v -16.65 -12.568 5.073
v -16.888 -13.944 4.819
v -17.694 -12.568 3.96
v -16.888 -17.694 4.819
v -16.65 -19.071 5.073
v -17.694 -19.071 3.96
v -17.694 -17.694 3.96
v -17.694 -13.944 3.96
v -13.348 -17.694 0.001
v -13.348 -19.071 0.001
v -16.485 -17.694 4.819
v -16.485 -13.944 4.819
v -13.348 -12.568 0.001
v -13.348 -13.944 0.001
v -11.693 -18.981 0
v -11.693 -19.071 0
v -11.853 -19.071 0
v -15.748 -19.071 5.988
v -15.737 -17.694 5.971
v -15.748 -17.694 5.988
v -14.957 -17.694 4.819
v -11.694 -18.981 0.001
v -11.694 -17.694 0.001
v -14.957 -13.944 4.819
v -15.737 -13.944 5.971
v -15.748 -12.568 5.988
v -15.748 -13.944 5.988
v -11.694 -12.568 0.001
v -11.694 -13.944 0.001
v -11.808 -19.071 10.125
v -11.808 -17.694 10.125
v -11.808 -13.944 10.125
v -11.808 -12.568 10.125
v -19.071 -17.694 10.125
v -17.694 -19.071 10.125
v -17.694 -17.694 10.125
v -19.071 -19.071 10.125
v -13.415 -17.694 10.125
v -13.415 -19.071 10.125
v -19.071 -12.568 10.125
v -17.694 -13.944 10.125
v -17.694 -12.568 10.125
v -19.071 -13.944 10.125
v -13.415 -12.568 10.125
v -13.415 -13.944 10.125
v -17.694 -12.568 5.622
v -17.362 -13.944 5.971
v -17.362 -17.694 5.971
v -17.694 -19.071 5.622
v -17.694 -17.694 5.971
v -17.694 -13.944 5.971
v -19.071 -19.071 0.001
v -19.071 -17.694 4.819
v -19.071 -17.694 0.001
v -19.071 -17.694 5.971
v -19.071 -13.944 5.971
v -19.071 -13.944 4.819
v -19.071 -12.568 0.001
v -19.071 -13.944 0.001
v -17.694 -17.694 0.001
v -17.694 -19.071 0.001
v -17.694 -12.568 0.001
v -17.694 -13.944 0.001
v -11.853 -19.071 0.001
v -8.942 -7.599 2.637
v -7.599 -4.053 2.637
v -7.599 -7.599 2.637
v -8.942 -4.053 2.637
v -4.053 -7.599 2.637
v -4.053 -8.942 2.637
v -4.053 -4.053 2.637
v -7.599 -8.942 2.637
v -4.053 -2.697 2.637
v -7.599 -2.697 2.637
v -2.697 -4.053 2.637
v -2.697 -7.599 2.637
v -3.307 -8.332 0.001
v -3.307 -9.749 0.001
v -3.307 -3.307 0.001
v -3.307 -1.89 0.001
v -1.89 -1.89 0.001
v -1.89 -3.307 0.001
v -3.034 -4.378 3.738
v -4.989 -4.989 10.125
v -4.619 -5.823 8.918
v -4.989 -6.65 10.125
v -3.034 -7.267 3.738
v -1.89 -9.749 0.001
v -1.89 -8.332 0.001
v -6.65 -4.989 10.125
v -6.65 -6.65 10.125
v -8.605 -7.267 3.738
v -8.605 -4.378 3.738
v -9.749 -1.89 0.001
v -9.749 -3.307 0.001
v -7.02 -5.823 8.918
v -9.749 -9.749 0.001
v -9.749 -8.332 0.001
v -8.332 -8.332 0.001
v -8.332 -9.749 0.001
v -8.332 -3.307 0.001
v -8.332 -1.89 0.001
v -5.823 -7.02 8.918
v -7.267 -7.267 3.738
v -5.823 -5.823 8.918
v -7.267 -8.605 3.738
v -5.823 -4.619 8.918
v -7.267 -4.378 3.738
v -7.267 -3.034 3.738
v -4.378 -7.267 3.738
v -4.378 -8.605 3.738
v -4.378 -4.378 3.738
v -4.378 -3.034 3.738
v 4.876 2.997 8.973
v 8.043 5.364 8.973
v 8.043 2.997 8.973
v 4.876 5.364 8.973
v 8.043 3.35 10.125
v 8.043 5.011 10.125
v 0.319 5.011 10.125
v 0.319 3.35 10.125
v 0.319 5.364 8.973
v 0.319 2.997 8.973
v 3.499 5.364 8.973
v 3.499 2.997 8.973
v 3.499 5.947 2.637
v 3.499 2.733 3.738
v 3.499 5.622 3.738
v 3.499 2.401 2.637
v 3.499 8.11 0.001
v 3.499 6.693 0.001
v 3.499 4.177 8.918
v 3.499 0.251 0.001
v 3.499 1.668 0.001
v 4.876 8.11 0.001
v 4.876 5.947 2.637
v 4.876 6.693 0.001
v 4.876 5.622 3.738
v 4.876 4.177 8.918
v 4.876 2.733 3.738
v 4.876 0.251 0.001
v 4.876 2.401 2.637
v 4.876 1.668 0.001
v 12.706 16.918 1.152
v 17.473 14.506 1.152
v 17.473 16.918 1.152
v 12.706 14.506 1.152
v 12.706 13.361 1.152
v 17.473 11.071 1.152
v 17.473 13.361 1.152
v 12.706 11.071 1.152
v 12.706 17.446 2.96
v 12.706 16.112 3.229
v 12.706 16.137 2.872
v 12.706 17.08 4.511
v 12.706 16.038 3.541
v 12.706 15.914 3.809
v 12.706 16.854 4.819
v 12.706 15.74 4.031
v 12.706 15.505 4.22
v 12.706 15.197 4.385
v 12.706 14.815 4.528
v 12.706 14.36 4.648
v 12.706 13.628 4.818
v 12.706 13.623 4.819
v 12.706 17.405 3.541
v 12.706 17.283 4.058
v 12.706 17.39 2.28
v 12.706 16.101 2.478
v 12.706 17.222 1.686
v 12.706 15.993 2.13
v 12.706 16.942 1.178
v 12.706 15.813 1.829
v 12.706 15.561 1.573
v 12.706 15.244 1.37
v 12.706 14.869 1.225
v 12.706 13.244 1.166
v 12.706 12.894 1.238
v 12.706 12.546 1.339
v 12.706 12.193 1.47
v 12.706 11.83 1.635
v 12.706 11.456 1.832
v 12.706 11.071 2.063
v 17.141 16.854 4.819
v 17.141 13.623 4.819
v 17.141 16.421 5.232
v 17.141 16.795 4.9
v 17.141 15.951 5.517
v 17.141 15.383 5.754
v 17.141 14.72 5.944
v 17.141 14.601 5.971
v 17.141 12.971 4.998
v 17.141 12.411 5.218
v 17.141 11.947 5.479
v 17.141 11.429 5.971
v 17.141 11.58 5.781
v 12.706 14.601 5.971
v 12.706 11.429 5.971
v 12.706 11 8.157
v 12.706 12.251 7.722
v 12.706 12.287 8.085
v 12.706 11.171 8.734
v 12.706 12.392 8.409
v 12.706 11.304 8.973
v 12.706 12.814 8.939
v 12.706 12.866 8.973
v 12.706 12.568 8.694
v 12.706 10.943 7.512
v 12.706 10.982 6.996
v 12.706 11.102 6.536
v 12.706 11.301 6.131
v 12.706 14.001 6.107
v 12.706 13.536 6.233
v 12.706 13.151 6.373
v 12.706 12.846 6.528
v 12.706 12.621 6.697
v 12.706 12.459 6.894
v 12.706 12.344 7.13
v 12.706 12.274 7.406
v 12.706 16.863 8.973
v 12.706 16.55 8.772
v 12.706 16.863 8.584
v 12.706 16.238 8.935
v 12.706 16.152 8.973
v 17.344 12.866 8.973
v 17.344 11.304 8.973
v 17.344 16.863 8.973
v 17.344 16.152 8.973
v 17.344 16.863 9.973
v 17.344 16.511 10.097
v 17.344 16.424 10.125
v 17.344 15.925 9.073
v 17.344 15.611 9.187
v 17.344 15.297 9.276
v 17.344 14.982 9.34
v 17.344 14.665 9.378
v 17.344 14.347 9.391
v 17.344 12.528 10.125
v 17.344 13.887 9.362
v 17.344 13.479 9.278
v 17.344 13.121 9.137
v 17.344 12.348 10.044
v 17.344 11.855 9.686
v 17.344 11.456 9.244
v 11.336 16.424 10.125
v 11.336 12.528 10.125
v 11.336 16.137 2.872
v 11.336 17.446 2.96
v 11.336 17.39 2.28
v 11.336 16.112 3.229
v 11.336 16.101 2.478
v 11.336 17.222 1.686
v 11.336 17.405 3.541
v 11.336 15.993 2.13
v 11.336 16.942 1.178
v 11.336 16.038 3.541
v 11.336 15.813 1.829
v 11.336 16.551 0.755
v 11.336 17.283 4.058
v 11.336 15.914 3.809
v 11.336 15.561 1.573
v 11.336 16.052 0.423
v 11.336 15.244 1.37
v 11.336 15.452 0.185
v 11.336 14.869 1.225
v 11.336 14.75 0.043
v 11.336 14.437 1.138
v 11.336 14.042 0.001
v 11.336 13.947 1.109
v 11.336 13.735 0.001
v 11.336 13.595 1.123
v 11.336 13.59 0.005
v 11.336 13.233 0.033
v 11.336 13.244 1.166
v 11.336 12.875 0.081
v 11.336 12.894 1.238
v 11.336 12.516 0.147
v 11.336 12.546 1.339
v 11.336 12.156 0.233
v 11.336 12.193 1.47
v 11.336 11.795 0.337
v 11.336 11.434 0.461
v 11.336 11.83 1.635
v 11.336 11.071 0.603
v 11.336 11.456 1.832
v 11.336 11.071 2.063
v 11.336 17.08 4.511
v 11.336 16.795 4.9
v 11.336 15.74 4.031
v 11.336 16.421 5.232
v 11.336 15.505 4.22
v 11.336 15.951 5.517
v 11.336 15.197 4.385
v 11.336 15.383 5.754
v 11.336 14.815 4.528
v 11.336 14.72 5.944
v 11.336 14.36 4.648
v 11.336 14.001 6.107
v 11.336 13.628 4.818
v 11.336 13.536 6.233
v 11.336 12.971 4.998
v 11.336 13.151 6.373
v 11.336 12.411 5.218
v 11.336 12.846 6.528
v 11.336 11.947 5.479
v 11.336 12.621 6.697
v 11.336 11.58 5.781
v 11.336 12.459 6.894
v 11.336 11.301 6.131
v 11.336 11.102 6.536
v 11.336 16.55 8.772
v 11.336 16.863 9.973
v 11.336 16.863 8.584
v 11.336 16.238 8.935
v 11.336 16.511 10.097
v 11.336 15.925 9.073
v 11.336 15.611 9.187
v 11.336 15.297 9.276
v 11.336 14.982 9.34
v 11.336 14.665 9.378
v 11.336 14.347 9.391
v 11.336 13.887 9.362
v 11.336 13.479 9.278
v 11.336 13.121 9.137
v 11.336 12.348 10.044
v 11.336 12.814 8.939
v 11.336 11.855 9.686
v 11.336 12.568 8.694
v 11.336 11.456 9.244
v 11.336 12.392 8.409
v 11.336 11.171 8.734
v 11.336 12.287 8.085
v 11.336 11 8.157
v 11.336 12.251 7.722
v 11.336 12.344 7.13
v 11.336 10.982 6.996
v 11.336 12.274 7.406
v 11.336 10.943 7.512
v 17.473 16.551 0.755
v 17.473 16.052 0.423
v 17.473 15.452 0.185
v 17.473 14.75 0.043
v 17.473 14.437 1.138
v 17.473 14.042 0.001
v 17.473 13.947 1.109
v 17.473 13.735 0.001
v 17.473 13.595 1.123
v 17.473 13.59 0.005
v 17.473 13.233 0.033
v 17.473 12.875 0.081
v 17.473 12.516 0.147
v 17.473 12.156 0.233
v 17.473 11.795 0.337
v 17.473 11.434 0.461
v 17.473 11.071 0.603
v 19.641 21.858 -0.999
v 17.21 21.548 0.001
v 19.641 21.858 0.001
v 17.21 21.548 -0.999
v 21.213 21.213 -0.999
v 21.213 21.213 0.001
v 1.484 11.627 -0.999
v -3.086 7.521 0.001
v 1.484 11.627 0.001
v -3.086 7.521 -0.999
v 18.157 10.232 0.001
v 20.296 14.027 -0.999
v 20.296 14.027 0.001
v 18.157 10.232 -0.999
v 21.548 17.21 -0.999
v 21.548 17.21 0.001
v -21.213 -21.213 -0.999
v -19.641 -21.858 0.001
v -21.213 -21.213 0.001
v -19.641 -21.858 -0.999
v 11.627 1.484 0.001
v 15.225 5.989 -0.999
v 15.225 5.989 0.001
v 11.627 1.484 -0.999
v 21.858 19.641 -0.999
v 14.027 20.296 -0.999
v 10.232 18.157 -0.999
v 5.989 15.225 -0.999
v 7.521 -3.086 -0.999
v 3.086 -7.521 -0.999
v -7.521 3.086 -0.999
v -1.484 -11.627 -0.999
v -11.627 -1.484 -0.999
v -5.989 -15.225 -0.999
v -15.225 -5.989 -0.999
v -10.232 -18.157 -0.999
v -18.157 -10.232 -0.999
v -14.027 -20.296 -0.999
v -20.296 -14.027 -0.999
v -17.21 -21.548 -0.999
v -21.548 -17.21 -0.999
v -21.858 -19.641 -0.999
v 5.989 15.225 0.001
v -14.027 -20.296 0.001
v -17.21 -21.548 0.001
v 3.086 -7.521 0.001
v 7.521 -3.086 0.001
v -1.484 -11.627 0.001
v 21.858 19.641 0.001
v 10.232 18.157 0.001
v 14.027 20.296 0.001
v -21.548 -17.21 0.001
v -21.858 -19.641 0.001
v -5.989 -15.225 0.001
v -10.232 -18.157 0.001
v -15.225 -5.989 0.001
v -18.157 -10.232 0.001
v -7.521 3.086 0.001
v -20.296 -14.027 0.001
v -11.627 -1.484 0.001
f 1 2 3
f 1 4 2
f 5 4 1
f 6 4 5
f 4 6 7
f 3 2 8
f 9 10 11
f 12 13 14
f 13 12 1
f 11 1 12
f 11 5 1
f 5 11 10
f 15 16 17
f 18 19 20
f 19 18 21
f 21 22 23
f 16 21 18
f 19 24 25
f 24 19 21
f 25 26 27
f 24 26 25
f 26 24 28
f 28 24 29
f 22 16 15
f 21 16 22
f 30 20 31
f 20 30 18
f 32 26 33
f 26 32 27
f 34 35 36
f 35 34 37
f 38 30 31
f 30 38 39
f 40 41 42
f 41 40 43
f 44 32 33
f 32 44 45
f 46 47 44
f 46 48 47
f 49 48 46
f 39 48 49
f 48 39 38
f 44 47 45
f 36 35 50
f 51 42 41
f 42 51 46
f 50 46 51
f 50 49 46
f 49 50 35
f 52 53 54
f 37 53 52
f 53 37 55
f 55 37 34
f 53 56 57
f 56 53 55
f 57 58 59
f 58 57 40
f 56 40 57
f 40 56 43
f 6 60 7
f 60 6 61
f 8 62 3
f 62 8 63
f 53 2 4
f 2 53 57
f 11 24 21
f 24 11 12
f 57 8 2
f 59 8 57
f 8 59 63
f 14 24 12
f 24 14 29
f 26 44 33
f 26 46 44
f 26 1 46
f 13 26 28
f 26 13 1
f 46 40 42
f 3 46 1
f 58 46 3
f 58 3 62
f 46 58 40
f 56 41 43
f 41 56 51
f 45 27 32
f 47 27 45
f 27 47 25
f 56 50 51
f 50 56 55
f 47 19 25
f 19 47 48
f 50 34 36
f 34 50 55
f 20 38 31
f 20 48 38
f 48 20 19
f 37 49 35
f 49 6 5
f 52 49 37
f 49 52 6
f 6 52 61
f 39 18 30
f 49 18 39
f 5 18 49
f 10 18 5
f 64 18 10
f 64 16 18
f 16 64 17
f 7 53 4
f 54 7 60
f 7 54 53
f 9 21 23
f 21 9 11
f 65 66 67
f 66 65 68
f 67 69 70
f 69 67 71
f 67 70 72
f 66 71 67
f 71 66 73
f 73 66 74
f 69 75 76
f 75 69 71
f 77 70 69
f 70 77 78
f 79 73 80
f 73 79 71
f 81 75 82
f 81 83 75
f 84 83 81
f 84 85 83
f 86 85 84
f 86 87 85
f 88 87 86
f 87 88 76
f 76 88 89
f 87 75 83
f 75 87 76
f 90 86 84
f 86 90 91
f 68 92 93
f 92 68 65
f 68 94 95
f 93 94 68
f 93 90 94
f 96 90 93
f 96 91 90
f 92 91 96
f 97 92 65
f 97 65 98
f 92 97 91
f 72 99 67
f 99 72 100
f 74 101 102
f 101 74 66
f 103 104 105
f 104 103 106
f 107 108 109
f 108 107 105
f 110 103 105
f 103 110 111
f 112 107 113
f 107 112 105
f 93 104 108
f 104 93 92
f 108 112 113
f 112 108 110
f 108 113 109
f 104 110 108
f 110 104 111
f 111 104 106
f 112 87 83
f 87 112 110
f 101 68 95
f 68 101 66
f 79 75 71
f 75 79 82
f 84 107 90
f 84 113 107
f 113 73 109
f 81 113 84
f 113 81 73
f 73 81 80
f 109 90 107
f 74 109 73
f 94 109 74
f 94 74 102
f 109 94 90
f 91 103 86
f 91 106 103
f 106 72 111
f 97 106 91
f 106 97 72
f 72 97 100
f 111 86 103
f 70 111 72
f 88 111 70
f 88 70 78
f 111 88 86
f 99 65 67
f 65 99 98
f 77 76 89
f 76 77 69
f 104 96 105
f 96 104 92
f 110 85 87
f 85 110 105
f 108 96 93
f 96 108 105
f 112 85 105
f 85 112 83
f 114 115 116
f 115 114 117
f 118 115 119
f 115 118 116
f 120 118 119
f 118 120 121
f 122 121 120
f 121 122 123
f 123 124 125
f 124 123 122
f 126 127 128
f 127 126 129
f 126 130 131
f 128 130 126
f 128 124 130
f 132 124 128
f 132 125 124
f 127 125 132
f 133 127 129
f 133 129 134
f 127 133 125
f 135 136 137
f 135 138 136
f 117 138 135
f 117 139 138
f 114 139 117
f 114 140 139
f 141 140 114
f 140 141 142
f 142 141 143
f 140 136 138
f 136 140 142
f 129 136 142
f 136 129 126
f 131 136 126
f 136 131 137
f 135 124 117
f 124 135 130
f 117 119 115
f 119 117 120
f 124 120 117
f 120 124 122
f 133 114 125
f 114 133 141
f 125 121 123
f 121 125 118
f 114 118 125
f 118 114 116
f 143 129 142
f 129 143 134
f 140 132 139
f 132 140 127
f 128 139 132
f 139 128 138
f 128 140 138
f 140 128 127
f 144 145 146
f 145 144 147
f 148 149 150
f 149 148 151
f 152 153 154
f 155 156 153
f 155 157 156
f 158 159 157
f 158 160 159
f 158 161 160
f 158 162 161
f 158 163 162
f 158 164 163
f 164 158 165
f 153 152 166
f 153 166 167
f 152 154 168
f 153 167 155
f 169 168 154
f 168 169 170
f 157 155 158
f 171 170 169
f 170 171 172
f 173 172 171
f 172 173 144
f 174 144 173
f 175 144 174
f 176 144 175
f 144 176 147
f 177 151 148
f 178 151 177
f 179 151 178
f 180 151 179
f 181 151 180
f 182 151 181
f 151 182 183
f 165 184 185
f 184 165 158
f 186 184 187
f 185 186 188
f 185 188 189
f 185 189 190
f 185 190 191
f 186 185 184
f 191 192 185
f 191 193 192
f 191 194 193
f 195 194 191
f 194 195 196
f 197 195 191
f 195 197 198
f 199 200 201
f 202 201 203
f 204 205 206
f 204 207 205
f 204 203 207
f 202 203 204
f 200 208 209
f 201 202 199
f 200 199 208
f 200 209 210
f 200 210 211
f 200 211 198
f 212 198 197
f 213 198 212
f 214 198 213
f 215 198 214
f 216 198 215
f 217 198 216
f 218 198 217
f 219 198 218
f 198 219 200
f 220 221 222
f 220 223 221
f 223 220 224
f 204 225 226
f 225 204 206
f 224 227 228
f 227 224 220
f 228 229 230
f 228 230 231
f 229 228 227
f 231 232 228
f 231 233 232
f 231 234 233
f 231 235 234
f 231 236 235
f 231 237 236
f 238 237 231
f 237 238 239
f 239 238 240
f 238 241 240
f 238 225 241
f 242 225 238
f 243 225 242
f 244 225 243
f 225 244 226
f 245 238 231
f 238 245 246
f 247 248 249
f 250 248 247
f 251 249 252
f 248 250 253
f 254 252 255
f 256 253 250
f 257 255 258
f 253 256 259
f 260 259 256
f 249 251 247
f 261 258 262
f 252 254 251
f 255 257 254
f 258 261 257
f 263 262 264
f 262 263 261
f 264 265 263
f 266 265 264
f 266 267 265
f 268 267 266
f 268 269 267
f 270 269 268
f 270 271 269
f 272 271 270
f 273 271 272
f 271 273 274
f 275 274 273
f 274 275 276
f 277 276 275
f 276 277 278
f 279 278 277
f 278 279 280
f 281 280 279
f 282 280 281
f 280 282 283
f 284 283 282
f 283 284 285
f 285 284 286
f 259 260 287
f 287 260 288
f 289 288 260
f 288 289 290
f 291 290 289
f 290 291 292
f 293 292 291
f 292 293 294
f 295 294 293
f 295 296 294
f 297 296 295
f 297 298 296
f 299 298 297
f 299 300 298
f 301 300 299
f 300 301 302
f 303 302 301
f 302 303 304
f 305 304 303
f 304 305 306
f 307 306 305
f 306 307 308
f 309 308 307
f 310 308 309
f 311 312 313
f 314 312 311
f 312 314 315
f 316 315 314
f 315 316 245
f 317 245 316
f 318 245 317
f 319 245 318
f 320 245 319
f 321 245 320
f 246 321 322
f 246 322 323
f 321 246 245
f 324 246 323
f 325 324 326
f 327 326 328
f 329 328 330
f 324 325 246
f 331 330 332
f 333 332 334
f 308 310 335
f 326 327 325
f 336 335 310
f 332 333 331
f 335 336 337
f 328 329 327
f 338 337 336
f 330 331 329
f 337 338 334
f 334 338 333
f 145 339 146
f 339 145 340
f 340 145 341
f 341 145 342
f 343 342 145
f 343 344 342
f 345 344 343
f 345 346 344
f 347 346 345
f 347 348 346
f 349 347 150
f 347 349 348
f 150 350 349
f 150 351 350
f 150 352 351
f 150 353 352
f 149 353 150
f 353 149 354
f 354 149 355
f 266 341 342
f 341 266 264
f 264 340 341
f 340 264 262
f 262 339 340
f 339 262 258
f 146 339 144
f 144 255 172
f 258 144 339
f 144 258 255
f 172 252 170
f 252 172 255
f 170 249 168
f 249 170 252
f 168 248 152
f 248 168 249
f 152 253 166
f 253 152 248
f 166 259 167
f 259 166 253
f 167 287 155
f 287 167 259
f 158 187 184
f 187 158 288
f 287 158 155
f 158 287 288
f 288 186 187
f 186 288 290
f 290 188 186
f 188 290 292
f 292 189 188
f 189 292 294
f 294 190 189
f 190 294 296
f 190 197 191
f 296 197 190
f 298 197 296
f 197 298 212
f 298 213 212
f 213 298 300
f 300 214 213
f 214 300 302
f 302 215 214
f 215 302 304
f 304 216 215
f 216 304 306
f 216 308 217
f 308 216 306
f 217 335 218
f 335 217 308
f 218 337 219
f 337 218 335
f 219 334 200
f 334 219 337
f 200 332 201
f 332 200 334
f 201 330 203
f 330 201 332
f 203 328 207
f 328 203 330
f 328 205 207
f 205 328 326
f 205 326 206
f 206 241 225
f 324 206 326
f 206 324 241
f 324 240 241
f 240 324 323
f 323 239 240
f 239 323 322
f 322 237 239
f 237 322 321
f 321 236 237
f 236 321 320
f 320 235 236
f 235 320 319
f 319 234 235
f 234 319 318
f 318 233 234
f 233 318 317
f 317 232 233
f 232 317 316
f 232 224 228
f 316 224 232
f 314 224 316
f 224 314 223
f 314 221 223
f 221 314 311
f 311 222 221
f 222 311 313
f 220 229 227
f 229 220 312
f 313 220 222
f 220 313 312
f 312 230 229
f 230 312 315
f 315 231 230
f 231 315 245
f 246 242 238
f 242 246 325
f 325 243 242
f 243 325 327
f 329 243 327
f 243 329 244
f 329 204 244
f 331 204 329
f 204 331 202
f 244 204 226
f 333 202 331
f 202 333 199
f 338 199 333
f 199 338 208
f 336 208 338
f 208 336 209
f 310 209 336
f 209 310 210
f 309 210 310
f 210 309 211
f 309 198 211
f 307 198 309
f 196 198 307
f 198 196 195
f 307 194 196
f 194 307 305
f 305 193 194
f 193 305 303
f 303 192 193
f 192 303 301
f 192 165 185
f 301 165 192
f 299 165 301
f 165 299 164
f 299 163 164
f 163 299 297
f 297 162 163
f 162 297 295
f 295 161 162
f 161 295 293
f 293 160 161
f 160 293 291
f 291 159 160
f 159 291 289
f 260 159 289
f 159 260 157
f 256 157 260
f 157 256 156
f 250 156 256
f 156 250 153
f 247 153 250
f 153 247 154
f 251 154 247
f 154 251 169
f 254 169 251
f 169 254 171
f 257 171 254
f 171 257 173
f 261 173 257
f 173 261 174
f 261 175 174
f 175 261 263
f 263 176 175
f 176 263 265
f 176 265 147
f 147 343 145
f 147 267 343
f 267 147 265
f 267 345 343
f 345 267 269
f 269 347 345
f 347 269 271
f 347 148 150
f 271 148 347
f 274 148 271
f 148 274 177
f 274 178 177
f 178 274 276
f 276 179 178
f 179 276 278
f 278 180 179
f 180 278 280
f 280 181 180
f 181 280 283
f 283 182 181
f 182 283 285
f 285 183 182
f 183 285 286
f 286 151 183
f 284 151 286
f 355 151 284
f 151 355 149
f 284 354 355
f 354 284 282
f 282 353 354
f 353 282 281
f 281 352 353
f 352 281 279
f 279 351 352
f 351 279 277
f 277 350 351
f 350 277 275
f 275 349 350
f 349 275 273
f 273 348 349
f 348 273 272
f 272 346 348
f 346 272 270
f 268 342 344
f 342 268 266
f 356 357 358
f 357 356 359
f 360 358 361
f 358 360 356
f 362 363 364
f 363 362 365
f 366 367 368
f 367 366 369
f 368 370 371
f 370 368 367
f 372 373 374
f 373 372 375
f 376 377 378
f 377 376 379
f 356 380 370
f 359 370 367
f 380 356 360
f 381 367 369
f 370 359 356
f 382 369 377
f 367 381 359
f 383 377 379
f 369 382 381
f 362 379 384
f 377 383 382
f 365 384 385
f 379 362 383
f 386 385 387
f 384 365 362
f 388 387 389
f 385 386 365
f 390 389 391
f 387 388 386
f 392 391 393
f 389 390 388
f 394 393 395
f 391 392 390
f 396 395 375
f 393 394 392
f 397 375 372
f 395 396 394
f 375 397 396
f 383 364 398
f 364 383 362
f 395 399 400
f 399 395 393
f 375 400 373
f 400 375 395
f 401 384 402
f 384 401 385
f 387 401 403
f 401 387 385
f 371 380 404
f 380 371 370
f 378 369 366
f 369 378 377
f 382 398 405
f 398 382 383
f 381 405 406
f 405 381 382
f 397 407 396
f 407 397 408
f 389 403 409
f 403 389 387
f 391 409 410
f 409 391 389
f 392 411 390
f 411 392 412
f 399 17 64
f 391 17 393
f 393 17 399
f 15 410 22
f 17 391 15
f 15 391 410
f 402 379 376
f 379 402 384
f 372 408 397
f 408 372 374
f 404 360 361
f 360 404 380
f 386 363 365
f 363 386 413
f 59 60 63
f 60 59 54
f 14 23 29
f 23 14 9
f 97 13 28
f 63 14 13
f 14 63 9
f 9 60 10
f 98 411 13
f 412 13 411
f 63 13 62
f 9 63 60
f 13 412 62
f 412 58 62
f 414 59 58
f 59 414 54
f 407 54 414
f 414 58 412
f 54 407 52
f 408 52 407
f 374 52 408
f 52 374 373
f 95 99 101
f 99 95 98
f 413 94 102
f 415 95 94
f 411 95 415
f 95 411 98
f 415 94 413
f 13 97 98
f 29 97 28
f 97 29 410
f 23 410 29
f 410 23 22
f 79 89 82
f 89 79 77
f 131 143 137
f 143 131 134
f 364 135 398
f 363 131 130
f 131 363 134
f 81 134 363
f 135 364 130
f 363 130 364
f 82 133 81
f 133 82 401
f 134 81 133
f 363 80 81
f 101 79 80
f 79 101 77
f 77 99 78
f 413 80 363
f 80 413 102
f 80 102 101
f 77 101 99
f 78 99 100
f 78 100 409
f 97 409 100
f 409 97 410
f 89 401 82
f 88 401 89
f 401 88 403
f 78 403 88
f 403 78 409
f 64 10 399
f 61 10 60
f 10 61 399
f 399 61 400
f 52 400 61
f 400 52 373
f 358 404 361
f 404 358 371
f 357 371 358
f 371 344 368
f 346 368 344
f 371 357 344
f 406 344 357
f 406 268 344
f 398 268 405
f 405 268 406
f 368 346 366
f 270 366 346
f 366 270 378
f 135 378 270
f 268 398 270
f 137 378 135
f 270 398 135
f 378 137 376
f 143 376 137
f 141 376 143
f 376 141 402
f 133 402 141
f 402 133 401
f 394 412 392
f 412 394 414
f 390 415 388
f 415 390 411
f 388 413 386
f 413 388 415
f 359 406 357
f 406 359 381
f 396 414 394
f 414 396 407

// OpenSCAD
// Creates a DuoView Name Statue
// David Haas
// 7/11/23

name2 = "KATE";
name1 = "HAAS";

letter_width = 10;
platform_depth = 1;

num_characters = len(name1) > len(name2) ? len(name1) : len(name2);
echo(num_characters);

// create platform
name_width = letter_width * num_characters;
color("LightSlateGray")
rotate([0,0,45])
resize([name_width*1.5,letter_width*1.5,0])
translate([0,0,-platform_depth + 0.001])
linear_extrude(platform_depth)
circle(name_width);

function round2(x,decimals=0) = round(x * 10^decimals) / 10^decimals;
function safetan(degrees) = min(max(tan(degrees),-1),1);
echo(round2(12.3257184,3));
echo(safetan(0),safetan(30),safetan(360));


module extrude_character(char_num, letter, letter_width, position,letter_space=0, extrusion_adjustment=0) {
    // TODO: the x translate adjustment must be zero for the first name, if you set it as letter_width instead it wont work. 
    translate([
        char_num*letter_width + (0 * round2(safetan(position),2)),
        char_num*letter_width + (letter_width * round2(cos(position),2)),
        0
    ])
    rotate([90,0,position])
    linear_extrude(letter_width + extrusion_adjustment) {
        text(
            letter, 
            letter_width,
            font="Consolas:style=Regular",
            halign="center",
            spacing=0,
            valign="bottom"
        );
    };
    echo(letter,"cos(position) =", round2(cos(position),2));
    echo(letter,"sin(position) =", round2(sin(position),2));
    echo(letter,"tan(position) =", safetan(position));
}

// create the letters
translate([-name_width/2,-name_width/2,0])
for (i = [0:num_characters]) {
    intersection() {
        if (i < len(name2)) {
            extrude_character(i, name2[i],letter_width, 0);
        }
        
        if (i < len(name1)) {
            extrude_character(i, name1[i],letter_width, 90);
            
        }
    
    }
 
}
